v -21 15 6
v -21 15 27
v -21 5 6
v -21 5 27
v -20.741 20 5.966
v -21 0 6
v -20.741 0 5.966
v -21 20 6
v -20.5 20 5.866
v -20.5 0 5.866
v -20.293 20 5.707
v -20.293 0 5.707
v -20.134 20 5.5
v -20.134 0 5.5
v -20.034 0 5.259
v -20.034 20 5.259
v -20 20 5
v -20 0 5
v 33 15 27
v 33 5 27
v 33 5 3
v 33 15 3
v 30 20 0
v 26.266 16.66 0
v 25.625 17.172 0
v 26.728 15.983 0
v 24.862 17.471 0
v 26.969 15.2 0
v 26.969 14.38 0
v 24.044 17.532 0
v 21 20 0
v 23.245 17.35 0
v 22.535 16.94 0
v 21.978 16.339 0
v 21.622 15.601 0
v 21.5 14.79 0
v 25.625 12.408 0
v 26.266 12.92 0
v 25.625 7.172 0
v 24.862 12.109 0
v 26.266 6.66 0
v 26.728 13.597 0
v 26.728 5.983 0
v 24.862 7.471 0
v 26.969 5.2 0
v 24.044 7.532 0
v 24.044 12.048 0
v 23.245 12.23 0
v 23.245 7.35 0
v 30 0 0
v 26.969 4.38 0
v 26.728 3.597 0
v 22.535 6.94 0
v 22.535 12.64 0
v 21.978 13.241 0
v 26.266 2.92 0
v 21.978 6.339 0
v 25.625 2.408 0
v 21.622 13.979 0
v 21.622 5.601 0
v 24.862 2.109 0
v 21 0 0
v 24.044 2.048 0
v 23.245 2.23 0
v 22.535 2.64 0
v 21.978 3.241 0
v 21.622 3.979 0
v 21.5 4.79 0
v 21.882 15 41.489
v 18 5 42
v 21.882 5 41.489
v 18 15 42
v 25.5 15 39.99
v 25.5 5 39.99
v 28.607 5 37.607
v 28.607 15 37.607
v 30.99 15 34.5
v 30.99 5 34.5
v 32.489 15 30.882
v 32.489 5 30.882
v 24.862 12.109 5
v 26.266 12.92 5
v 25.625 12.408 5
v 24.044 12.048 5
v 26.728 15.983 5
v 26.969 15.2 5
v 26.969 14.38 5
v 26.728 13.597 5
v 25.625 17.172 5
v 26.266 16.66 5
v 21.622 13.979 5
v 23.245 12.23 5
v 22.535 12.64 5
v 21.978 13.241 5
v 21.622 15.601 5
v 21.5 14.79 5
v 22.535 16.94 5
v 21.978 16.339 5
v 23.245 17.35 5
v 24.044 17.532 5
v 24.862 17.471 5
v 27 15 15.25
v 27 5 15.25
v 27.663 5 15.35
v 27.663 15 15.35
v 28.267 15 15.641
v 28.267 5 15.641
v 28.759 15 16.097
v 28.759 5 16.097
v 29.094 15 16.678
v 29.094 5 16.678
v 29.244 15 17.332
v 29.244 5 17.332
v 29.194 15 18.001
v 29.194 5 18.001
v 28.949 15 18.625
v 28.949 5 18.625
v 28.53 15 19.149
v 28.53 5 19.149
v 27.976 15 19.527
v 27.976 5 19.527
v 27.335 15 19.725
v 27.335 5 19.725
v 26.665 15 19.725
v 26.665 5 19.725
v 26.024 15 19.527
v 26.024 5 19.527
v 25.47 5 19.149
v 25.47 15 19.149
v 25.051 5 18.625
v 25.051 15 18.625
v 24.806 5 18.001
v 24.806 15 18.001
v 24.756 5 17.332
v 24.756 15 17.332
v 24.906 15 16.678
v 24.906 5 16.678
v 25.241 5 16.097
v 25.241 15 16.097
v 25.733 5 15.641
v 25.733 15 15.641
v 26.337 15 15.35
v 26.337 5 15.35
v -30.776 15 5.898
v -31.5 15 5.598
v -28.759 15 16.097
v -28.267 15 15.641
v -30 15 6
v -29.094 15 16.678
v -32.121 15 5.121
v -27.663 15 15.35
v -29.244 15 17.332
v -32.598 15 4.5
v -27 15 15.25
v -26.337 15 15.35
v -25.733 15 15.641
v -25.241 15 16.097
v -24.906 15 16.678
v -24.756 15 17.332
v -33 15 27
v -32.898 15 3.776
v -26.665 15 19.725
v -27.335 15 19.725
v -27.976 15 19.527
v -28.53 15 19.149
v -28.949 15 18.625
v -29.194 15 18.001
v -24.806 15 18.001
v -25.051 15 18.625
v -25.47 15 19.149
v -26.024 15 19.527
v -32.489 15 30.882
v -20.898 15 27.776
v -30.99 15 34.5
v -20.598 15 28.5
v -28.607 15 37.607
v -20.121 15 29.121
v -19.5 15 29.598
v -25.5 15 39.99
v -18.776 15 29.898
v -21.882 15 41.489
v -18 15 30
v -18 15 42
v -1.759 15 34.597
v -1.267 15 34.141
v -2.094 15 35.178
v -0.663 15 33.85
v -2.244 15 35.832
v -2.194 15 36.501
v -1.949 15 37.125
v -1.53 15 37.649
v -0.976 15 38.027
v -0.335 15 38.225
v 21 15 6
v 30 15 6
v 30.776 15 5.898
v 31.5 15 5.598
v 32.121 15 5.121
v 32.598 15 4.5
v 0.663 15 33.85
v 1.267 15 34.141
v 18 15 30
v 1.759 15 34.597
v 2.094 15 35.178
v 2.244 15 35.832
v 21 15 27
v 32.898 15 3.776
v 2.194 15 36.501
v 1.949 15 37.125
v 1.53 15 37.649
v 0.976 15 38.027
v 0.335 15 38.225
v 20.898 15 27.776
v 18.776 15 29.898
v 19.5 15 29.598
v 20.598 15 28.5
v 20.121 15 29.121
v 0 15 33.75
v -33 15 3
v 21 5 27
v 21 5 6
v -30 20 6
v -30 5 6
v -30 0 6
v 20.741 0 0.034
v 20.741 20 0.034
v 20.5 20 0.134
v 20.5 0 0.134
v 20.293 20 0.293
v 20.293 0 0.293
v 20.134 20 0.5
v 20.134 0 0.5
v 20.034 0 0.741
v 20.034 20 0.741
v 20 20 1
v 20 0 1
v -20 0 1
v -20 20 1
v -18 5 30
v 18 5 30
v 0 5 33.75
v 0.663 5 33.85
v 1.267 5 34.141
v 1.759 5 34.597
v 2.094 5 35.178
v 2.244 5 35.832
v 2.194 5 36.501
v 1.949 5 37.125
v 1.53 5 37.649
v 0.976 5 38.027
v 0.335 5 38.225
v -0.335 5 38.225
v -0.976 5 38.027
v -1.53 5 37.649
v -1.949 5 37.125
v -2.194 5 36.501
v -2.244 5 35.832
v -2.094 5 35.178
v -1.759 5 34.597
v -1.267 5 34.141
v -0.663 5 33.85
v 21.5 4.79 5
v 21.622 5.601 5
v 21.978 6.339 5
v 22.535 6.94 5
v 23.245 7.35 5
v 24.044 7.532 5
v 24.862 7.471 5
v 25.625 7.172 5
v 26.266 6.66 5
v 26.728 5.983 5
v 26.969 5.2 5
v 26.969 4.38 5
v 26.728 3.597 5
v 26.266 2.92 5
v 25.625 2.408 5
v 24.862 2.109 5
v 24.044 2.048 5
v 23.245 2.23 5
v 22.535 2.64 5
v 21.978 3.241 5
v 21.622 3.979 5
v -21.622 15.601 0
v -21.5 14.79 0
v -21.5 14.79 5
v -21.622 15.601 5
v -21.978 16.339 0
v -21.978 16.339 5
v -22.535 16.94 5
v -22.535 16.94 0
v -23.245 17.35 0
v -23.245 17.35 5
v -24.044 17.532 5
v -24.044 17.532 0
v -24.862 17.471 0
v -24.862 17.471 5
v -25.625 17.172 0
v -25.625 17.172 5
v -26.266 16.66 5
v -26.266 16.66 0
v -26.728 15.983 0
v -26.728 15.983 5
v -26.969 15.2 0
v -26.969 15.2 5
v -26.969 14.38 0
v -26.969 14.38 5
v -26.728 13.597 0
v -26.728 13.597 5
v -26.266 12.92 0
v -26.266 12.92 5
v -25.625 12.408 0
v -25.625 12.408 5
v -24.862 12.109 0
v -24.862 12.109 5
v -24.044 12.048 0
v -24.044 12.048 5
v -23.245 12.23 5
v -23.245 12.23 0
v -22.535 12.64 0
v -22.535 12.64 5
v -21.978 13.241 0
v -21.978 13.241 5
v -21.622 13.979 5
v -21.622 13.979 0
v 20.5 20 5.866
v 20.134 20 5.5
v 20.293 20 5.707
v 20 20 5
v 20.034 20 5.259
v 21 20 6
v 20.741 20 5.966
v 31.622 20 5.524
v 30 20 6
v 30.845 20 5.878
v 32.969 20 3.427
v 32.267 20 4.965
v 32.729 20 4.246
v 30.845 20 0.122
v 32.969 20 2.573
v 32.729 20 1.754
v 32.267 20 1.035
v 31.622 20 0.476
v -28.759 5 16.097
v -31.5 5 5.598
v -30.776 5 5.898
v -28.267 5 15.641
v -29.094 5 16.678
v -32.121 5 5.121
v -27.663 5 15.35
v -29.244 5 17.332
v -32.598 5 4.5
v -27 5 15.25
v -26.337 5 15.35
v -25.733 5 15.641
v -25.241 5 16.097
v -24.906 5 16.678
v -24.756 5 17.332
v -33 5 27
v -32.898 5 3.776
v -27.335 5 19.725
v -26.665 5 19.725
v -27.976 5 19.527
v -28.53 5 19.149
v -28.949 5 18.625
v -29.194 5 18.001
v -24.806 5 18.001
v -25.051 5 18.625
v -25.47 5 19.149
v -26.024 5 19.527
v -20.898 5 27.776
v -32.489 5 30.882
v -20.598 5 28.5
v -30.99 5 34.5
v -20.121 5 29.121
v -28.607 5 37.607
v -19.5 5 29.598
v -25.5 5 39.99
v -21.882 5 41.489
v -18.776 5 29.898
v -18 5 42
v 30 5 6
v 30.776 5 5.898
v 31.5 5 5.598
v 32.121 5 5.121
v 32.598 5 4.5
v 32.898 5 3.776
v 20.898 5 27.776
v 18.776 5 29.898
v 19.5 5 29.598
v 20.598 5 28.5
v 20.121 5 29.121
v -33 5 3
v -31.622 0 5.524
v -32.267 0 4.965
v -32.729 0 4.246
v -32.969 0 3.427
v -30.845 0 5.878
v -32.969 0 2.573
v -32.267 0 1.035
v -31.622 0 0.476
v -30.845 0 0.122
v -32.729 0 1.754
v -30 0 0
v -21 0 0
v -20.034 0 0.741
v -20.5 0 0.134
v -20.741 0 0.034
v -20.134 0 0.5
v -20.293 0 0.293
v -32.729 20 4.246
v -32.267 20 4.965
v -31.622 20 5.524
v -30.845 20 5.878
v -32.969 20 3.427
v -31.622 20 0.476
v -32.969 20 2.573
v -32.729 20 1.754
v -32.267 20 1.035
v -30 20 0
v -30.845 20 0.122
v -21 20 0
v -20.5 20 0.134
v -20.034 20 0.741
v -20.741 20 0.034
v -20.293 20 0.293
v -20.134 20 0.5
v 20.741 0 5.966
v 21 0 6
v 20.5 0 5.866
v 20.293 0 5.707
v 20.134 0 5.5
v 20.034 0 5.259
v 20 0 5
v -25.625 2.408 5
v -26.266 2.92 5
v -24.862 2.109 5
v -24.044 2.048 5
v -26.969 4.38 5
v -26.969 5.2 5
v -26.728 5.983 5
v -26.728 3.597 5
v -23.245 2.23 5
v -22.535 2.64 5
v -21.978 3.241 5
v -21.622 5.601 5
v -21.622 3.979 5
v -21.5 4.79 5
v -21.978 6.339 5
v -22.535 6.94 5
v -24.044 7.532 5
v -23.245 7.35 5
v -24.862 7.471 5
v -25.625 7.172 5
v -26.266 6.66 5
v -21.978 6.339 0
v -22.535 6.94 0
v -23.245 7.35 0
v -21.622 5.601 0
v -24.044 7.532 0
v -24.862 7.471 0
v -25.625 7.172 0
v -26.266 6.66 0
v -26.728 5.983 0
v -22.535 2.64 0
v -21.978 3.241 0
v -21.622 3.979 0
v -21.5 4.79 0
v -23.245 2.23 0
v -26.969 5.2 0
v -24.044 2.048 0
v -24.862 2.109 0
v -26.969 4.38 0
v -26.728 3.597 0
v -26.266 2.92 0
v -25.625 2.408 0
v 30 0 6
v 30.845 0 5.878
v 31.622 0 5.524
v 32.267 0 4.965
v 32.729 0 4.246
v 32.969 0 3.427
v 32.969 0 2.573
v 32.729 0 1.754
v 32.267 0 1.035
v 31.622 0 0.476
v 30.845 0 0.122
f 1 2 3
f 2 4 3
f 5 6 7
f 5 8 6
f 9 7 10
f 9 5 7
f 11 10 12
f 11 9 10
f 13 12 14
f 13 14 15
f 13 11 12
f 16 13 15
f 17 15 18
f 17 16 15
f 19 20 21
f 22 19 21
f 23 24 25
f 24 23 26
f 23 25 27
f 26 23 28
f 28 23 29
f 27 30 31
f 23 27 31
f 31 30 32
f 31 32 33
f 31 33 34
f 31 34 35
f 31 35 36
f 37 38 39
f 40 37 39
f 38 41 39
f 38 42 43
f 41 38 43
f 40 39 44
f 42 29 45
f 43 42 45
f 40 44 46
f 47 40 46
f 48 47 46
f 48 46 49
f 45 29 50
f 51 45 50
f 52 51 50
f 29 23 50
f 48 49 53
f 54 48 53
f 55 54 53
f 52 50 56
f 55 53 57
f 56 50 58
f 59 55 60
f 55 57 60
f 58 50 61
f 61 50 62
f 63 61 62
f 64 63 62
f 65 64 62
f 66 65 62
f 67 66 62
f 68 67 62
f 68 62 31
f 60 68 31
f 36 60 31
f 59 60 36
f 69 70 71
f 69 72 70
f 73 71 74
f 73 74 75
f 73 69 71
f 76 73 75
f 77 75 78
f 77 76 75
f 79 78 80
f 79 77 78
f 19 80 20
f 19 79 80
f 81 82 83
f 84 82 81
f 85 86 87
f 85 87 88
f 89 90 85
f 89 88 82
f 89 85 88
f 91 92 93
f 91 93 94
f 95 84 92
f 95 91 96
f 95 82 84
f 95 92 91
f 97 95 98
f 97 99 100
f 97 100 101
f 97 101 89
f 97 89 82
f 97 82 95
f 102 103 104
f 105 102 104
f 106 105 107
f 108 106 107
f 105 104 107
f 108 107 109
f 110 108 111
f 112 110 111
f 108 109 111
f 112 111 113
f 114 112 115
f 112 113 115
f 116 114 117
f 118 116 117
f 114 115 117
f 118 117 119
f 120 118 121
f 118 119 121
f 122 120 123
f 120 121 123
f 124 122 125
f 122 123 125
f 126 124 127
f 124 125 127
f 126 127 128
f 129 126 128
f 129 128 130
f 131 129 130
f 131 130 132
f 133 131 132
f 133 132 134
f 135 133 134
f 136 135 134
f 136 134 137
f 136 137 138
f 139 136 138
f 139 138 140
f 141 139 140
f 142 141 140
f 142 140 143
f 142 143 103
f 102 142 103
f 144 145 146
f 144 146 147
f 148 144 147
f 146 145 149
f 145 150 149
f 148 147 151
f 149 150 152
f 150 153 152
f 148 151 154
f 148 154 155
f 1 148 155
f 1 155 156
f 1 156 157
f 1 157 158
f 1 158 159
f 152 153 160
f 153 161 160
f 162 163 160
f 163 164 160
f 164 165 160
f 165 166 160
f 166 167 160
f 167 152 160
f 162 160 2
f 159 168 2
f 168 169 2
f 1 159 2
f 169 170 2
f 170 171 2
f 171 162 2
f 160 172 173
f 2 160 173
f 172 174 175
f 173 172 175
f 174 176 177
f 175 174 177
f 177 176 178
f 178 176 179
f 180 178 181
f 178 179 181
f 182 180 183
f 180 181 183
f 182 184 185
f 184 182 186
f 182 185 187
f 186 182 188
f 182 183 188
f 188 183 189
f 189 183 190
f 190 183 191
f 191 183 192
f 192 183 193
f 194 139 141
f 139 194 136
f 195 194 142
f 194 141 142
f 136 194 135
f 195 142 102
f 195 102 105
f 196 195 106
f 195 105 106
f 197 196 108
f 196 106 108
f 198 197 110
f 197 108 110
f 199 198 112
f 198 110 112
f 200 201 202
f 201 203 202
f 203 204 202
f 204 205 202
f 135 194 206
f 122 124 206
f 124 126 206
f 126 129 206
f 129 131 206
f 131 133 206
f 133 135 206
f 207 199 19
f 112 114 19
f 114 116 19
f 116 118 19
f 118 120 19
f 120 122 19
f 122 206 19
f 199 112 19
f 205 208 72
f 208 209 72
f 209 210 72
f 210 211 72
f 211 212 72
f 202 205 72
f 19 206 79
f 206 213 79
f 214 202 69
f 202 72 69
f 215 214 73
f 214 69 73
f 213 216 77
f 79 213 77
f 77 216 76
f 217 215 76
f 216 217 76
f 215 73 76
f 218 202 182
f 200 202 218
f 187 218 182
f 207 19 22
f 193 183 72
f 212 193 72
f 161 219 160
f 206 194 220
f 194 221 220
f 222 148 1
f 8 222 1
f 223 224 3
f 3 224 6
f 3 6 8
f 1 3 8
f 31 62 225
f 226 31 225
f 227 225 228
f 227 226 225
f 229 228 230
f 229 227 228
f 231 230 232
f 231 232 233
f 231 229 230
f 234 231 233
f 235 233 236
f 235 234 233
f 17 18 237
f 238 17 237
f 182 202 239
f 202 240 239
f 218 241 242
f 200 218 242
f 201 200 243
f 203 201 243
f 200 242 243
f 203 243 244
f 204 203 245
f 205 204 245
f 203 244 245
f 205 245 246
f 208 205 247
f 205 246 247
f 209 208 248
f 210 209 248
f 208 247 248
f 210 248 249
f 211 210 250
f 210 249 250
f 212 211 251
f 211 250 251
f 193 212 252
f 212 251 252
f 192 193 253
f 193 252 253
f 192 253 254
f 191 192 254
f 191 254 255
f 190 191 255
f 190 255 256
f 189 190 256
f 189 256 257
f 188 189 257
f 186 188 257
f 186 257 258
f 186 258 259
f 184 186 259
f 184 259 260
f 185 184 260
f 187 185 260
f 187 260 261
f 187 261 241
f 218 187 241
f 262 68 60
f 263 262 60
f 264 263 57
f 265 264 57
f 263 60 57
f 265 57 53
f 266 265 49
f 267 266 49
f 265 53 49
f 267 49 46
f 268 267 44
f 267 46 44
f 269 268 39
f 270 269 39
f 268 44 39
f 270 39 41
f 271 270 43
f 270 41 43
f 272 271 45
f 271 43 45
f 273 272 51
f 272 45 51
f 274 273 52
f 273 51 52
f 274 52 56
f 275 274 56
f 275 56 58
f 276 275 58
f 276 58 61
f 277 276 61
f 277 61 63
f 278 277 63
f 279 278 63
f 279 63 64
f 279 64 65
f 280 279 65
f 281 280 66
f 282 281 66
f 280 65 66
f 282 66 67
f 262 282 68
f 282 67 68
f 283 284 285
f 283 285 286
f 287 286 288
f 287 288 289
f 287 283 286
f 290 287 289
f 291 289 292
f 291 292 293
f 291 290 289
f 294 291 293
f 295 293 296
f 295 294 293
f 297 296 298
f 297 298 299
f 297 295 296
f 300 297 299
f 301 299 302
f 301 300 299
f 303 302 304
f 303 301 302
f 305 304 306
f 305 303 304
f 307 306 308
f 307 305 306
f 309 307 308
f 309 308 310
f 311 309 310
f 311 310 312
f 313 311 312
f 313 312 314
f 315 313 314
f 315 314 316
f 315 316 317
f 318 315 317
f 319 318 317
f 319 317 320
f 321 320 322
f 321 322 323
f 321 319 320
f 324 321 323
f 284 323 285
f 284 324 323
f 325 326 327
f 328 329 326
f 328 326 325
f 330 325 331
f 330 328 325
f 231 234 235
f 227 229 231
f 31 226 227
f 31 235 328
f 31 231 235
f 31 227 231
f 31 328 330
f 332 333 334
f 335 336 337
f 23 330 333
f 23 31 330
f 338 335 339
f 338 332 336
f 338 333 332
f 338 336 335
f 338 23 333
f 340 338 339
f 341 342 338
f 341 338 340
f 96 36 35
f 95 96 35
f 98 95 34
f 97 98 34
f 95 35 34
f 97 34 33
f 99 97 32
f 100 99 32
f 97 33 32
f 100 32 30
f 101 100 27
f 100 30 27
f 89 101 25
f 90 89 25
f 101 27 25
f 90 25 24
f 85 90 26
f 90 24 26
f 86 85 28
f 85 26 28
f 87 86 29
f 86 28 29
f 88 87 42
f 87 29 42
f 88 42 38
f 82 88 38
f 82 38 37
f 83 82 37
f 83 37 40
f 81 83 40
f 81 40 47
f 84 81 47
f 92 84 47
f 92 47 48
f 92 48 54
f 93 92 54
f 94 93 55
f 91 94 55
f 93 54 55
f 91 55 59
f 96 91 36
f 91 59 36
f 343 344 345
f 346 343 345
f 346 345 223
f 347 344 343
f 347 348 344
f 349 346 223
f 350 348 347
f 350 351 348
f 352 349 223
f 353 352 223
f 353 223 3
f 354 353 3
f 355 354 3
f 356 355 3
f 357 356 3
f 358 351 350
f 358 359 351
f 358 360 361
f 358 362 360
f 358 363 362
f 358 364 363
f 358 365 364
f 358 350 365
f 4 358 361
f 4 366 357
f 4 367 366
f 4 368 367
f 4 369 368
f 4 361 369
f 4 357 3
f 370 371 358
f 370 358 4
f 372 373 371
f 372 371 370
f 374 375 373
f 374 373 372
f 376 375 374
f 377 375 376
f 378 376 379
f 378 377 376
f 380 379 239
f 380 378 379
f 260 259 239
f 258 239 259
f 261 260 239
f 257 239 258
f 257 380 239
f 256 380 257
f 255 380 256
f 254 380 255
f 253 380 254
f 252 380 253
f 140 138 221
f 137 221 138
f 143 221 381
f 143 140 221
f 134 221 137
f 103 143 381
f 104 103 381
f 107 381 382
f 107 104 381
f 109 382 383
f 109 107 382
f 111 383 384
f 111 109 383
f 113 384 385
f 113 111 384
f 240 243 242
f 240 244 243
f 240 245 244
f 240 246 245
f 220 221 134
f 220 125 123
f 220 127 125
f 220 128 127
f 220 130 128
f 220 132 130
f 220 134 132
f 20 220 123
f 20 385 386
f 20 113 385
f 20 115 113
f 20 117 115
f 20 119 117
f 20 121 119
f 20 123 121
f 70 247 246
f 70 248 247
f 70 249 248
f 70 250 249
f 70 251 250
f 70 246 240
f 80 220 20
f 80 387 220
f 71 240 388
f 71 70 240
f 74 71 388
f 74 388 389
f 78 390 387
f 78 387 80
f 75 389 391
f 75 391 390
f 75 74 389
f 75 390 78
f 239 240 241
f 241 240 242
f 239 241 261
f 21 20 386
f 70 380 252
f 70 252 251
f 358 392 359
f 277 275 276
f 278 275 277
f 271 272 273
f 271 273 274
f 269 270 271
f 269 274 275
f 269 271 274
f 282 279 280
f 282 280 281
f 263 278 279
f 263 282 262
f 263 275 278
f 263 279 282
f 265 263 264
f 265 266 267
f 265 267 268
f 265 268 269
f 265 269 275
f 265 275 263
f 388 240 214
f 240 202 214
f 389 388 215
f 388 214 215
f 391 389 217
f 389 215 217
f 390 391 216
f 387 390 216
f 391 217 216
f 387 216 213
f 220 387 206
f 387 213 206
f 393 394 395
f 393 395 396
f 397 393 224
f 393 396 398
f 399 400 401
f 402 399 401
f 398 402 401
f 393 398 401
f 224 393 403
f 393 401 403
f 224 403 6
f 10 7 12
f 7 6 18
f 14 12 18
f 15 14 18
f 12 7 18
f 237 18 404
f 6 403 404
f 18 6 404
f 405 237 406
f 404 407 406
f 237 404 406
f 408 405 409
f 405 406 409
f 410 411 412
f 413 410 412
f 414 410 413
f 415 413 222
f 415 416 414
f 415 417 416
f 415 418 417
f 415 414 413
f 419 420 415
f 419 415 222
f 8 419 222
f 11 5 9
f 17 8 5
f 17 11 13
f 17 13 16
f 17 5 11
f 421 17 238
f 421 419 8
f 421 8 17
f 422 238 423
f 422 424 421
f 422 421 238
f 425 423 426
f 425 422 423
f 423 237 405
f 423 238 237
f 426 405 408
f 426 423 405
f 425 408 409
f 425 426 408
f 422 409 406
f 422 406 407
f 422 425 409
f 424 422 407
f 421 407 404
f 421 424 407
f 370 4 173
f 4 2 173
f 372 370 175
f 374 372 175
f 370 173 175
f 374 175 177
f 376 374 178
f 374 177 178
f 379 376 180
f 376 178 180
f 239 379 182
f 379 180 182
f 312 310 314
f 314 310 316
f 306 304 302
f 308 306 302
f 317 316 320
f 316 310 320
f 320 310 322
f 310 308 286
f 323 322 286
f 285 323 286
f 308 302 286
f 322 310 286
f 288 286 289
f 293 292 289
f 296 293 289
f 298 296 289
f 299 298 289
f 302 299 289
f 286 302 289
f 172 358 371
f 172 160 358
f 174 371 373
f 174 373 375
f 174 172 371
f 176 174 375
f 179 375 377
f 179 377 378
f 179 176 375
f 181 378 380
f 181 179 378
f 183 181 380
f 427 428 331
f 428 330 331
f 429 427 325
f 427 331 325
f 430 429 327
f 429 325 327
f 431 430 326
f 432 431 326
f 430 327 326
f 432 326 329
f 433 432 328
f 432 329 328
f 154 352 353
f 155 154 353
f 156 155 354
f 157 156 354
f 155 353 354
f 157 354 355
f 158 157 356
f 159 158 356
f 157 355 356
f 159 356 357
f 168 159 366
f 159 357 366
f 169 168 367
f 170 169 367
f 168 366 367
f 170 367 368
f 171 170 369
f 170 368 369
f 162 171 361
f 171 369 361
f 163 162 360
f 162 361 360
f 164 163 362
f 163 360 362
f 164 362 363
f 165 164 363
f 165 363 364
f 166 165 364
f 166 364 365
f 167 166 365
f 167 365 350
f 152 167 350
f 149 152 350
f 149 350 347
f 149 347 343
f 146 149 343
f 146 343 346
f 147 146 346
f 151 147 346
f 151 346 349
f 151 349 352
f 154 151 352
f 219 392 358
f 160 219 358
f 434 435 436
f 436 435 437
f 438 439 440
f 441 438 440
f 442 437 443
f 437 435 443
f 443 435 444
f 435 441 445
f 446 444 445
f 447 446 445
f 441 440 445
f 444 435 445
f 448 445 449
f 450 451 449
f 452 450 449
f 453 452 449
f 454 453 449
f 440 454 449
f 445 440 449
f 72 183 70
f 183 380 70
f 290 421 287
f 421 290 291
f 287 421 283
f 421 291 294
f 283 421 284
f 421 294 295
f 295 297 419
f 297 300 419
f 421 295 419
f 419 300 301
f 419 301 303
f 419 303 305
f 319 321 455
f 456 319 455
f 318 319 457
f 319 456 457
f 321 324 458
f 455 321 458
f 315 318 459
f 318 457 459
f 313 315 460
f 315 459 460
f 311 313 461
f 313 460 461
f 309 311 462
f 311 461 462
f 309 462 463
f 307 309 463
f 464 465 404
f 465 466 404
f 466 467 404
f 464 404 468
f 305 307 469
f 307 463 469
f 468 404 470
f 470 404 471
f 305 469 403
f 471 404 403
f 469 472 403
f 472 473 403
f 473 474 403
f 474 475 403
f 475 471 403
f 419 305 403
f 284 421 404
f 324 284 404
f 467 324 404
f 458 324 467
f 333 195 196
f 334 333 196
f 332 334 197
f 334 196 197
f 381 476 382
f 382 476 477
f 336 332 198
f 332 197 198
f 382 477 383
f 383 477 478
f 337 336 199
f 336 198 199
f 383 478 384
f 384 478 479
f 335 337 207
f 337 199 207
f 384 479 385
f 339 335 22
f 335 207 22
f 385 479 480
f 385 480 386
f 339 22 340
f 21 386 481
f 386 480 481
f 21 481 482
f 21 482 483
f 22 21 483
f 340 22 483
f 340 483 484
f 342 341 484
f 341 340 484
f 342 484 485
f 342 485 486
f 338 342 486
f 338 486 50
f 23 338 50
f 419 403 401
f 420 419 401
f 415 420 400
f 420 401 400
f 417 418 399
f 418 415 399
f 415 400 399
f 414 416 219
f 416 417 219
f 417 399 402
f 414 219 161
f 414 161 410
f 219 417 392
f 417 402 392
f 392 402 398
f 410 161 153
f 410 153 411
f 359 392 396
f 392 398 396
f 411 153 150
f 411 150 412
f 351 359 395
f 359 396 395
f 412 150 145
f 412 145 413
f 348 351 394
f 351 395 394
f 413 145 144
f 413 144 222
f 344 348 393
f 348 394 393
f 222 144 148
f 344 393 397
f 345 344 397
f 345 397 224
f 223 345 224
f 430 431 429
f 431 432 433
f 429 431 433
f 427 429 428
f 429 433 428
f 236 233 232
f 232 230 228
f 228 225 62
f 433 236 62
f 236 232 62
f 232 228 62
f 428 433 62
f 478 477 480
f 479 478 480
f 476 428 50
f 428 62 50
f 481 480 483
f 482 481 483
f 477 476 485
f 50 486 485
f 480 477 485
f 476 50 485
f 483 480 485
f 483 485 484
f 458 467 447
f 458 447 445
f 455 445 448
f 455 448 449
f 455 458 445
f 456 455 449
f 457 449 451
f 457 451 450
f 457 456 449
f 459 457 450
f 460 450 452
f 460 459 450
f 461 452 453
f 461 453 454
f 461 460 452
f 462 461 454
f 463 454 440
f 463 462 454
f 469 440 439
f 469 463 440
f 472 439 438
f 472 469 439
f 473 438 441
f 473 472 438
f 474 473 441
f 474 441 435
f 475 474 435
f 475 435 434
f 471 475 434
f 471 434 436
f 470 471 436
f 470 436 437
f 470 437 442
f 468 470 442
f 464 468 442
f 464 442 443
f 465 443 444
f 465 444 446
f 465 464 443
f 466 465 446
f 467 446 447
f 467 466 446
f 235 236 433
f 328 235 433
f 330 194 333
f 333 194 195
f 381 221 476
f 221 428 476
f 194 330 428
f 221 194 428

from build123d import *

# Parameters (mm, degrees)
BOSS_EXTRUDE1_DEPTH = 20
SKETCH2_R           = 2.75
CUT_EXTRUDE1_DEPTH  = 5
FILLET1_R           = 1
SKETCH7_W           = 42
SKETCH7_H           = 12
CUT_EXTRUDE3_DEPTH  = 5
SKETCH9_R           = 2.25
CUT_EXTRUDE5_DEPTH  = 56.479726027
FILLET3_R           = 15
FILLET4_R           = 3
FILLET5_R           = 3


# Some blends are built 0.0001 mm under size
with BuildPart() as part:
    # Sketch1 → Boss-Extrude1 (new body)
    with BuildSketch(Plane(origin=(0, 0, 0), x_dir=(1, 0, 0), z_dir=(0, 1, 0))):
        Polygon((21, -30), (-21, -30), (-21, -6), (-20, -6), (-20, 0), (-33, 0), (-33, -42), (33, -42), (33, 0), (20, 0), (20, -6), (21, -6), align=None)
    extrude(amount=BOSS_EXTRUDE1_DEPTH)

    # Sketch2 → Cut-Extrude1 (cut)
    with BuildSketch(Plane(origin=(0, 0, 0), x_dir=(-1, 0, 0), z_dir=(0, 0, -1))):
        with Locations((-24.25, 14.79)):
            Circle(SKETCH2_R)
        with Locations((-24.25, 4.79)):
            Circle(SKETCH2_R)
    cut_extrude1 = extrude(amount=-CUT_EXTRUDE1_DEPTH, mode=Mode.SUBTRACT)

    # Mirror1: Cut-Extrude1 across plane
    add(cut_extrude1.mirror(Plane(origin=(0, 0, 0), x_dir=(0, 0, 1), z_dir=(1, 0, 0))), mode=Mode.SUBTRACT)

    # Fillet1
    fillet1_edges = [part.edges().sort_by_distance(p)[0] for p in [
        (-20, 10, 0),
        (20, 10, 0),
        (20, 10, 6),
        (-20, 10, 6),
    ]]
    fillet(fillet1_edges, radius=FILLET1_R - 0.0001)  # a hair under: the kernel refuses the full size

    # Sketch7 → Cut-Extrude3 (cut)
    with BuildSketch(Plane.XZ):
        Polygon((-33, 6), (-21, 6), (-21, 30), (-21, 42), (-33, 42), align=None)
        with Locations((0, 36)):
            Rectangle(SKETCH7_W, SKETCH7_H)
        Polygon((21, 42), (21, 30), (21, 6), (33, 6), (33, 42), align=None)
    cut_extrude3 = extrude(amount=-CUT_EXTRUDE3_DEPTH, mode=Mode.SUBTRACT)

    # Mirror2: Cut-Extrude3 across plane
    add(cut_extrude3.mirror(Plane.ZX.offset(10)), mode=Mode.SUBTRACT)

    # Sketch9 → Cut-Extrude5 (cut, through all)
    with BuildSketch(Plane.XZ.offset(-5)):
        with Locations(Location((-27, 17.5, 0), (0, 0, 270))):
            Circle(SKETCH9_R)
        with Locations(Location((27, 17.5, 0), (0, 0, 270))):
            Circle(SKETCH9_R)
        with Locations(Location((0, 36, 0), (0, 0, 270))):
            Circle(SKETCH9_R)
    extrude(amount=-CUT_EXTRUDE5_DEPTH, mode=Mode.SUBTRACT)

    # Fillet3
    fillet3_edges = [part.edges().sort_by_distance(p)[0] for p in [
        (-33, 10, 42),
        (33, 10, 42),
    ]]
    fillet(fillet3_edges, radius=FILLET3_R)

    # Fillet4
    fillet4_edges = [part.edges().sort_by_distance(p)[0] for p in [
        (-21, 10, 30),
        (21, 10, 30),
    ]]
    fillet(fillet4_edges, radius=FILLET4_R)

    # Fillet5
    # the kernel refuses this fillet: 3 mm, written as the material it takes off along each edge
    with BuildSketch(Plane(origin=(-33, 27.5, 6), x_dir=(1, 0, 0), z_dir=(0, -1, 0)), Plane(origin=(33, -7.5, 6), x_dir=(-1, 0, 0), z_dir=(0, 1, 0))) as fillet5_piece_1:
        with BuildLine():
            CenterArc((FILLET5_R, -FILLET5_R), FILLET5_R, 90, 90)
            Line((0, -FILLET5_R), (0, 0))
            Line((0, 0), (FILLET5_R, 0))
        make_face()
    extrude(amount=12.5, mode=Mode.SUBTRACT)
    with BuildSketch(Plane(origin=(33, 27.5, 6), x_dir=(-1, 0, 0), z_dir=(0, -1, 0)), Plane(origin=(-33, -7.5, 6), x_dir=(1, 0, 0), z_dir=(0, 1, 0))) as fillet5_piece_2:
        with BuildLine():
            CenterArc((FILLET5_R, FILLET5_R), FILLET5_R, 180, 90)
            Line((0, FILLET5_R), (0, 0))
            Line((0, 0), (FILLET5_R, 0))
        make_face()
    extrude(amount=12.5, mode=Mode.SUBTRACT)
    with BuildSketch(Plane(origin=(-33, -7.5, 0), x_dir=(0, 0, 1), z_dir=(0, 1, 0))) as fillet5_piece_3:
        with BuildLine():
            CenterArc((FILLET5_R, FILLET5_R), FILLET5_R, 180, 90)
            Line((0, FILLET5_R), (0, 0))
            Line((0, 0), (FILLET5_R, 0))
        make_face()
    extrude(amount=35, mode=Mode.SUBTRACT)
    with BuildSketch(Plane(origin=(33, -7.5, 0), x_dir=(0, 0, 1), z_dir=(0, 1, 0))) as fillet5_piece_4:
        with BuildLine():
            CenterArc((FILLET5_R, -FILLET5_R), FILLET5_R, 90, 90)
            Line((0, -FILLET5_R), (0, 0))
            Line((0, 0), (FILLET5_R, 0))
        make_face()
    extrude(amount=35, mode=Mode.SUBTRACT)


solid = part.part
